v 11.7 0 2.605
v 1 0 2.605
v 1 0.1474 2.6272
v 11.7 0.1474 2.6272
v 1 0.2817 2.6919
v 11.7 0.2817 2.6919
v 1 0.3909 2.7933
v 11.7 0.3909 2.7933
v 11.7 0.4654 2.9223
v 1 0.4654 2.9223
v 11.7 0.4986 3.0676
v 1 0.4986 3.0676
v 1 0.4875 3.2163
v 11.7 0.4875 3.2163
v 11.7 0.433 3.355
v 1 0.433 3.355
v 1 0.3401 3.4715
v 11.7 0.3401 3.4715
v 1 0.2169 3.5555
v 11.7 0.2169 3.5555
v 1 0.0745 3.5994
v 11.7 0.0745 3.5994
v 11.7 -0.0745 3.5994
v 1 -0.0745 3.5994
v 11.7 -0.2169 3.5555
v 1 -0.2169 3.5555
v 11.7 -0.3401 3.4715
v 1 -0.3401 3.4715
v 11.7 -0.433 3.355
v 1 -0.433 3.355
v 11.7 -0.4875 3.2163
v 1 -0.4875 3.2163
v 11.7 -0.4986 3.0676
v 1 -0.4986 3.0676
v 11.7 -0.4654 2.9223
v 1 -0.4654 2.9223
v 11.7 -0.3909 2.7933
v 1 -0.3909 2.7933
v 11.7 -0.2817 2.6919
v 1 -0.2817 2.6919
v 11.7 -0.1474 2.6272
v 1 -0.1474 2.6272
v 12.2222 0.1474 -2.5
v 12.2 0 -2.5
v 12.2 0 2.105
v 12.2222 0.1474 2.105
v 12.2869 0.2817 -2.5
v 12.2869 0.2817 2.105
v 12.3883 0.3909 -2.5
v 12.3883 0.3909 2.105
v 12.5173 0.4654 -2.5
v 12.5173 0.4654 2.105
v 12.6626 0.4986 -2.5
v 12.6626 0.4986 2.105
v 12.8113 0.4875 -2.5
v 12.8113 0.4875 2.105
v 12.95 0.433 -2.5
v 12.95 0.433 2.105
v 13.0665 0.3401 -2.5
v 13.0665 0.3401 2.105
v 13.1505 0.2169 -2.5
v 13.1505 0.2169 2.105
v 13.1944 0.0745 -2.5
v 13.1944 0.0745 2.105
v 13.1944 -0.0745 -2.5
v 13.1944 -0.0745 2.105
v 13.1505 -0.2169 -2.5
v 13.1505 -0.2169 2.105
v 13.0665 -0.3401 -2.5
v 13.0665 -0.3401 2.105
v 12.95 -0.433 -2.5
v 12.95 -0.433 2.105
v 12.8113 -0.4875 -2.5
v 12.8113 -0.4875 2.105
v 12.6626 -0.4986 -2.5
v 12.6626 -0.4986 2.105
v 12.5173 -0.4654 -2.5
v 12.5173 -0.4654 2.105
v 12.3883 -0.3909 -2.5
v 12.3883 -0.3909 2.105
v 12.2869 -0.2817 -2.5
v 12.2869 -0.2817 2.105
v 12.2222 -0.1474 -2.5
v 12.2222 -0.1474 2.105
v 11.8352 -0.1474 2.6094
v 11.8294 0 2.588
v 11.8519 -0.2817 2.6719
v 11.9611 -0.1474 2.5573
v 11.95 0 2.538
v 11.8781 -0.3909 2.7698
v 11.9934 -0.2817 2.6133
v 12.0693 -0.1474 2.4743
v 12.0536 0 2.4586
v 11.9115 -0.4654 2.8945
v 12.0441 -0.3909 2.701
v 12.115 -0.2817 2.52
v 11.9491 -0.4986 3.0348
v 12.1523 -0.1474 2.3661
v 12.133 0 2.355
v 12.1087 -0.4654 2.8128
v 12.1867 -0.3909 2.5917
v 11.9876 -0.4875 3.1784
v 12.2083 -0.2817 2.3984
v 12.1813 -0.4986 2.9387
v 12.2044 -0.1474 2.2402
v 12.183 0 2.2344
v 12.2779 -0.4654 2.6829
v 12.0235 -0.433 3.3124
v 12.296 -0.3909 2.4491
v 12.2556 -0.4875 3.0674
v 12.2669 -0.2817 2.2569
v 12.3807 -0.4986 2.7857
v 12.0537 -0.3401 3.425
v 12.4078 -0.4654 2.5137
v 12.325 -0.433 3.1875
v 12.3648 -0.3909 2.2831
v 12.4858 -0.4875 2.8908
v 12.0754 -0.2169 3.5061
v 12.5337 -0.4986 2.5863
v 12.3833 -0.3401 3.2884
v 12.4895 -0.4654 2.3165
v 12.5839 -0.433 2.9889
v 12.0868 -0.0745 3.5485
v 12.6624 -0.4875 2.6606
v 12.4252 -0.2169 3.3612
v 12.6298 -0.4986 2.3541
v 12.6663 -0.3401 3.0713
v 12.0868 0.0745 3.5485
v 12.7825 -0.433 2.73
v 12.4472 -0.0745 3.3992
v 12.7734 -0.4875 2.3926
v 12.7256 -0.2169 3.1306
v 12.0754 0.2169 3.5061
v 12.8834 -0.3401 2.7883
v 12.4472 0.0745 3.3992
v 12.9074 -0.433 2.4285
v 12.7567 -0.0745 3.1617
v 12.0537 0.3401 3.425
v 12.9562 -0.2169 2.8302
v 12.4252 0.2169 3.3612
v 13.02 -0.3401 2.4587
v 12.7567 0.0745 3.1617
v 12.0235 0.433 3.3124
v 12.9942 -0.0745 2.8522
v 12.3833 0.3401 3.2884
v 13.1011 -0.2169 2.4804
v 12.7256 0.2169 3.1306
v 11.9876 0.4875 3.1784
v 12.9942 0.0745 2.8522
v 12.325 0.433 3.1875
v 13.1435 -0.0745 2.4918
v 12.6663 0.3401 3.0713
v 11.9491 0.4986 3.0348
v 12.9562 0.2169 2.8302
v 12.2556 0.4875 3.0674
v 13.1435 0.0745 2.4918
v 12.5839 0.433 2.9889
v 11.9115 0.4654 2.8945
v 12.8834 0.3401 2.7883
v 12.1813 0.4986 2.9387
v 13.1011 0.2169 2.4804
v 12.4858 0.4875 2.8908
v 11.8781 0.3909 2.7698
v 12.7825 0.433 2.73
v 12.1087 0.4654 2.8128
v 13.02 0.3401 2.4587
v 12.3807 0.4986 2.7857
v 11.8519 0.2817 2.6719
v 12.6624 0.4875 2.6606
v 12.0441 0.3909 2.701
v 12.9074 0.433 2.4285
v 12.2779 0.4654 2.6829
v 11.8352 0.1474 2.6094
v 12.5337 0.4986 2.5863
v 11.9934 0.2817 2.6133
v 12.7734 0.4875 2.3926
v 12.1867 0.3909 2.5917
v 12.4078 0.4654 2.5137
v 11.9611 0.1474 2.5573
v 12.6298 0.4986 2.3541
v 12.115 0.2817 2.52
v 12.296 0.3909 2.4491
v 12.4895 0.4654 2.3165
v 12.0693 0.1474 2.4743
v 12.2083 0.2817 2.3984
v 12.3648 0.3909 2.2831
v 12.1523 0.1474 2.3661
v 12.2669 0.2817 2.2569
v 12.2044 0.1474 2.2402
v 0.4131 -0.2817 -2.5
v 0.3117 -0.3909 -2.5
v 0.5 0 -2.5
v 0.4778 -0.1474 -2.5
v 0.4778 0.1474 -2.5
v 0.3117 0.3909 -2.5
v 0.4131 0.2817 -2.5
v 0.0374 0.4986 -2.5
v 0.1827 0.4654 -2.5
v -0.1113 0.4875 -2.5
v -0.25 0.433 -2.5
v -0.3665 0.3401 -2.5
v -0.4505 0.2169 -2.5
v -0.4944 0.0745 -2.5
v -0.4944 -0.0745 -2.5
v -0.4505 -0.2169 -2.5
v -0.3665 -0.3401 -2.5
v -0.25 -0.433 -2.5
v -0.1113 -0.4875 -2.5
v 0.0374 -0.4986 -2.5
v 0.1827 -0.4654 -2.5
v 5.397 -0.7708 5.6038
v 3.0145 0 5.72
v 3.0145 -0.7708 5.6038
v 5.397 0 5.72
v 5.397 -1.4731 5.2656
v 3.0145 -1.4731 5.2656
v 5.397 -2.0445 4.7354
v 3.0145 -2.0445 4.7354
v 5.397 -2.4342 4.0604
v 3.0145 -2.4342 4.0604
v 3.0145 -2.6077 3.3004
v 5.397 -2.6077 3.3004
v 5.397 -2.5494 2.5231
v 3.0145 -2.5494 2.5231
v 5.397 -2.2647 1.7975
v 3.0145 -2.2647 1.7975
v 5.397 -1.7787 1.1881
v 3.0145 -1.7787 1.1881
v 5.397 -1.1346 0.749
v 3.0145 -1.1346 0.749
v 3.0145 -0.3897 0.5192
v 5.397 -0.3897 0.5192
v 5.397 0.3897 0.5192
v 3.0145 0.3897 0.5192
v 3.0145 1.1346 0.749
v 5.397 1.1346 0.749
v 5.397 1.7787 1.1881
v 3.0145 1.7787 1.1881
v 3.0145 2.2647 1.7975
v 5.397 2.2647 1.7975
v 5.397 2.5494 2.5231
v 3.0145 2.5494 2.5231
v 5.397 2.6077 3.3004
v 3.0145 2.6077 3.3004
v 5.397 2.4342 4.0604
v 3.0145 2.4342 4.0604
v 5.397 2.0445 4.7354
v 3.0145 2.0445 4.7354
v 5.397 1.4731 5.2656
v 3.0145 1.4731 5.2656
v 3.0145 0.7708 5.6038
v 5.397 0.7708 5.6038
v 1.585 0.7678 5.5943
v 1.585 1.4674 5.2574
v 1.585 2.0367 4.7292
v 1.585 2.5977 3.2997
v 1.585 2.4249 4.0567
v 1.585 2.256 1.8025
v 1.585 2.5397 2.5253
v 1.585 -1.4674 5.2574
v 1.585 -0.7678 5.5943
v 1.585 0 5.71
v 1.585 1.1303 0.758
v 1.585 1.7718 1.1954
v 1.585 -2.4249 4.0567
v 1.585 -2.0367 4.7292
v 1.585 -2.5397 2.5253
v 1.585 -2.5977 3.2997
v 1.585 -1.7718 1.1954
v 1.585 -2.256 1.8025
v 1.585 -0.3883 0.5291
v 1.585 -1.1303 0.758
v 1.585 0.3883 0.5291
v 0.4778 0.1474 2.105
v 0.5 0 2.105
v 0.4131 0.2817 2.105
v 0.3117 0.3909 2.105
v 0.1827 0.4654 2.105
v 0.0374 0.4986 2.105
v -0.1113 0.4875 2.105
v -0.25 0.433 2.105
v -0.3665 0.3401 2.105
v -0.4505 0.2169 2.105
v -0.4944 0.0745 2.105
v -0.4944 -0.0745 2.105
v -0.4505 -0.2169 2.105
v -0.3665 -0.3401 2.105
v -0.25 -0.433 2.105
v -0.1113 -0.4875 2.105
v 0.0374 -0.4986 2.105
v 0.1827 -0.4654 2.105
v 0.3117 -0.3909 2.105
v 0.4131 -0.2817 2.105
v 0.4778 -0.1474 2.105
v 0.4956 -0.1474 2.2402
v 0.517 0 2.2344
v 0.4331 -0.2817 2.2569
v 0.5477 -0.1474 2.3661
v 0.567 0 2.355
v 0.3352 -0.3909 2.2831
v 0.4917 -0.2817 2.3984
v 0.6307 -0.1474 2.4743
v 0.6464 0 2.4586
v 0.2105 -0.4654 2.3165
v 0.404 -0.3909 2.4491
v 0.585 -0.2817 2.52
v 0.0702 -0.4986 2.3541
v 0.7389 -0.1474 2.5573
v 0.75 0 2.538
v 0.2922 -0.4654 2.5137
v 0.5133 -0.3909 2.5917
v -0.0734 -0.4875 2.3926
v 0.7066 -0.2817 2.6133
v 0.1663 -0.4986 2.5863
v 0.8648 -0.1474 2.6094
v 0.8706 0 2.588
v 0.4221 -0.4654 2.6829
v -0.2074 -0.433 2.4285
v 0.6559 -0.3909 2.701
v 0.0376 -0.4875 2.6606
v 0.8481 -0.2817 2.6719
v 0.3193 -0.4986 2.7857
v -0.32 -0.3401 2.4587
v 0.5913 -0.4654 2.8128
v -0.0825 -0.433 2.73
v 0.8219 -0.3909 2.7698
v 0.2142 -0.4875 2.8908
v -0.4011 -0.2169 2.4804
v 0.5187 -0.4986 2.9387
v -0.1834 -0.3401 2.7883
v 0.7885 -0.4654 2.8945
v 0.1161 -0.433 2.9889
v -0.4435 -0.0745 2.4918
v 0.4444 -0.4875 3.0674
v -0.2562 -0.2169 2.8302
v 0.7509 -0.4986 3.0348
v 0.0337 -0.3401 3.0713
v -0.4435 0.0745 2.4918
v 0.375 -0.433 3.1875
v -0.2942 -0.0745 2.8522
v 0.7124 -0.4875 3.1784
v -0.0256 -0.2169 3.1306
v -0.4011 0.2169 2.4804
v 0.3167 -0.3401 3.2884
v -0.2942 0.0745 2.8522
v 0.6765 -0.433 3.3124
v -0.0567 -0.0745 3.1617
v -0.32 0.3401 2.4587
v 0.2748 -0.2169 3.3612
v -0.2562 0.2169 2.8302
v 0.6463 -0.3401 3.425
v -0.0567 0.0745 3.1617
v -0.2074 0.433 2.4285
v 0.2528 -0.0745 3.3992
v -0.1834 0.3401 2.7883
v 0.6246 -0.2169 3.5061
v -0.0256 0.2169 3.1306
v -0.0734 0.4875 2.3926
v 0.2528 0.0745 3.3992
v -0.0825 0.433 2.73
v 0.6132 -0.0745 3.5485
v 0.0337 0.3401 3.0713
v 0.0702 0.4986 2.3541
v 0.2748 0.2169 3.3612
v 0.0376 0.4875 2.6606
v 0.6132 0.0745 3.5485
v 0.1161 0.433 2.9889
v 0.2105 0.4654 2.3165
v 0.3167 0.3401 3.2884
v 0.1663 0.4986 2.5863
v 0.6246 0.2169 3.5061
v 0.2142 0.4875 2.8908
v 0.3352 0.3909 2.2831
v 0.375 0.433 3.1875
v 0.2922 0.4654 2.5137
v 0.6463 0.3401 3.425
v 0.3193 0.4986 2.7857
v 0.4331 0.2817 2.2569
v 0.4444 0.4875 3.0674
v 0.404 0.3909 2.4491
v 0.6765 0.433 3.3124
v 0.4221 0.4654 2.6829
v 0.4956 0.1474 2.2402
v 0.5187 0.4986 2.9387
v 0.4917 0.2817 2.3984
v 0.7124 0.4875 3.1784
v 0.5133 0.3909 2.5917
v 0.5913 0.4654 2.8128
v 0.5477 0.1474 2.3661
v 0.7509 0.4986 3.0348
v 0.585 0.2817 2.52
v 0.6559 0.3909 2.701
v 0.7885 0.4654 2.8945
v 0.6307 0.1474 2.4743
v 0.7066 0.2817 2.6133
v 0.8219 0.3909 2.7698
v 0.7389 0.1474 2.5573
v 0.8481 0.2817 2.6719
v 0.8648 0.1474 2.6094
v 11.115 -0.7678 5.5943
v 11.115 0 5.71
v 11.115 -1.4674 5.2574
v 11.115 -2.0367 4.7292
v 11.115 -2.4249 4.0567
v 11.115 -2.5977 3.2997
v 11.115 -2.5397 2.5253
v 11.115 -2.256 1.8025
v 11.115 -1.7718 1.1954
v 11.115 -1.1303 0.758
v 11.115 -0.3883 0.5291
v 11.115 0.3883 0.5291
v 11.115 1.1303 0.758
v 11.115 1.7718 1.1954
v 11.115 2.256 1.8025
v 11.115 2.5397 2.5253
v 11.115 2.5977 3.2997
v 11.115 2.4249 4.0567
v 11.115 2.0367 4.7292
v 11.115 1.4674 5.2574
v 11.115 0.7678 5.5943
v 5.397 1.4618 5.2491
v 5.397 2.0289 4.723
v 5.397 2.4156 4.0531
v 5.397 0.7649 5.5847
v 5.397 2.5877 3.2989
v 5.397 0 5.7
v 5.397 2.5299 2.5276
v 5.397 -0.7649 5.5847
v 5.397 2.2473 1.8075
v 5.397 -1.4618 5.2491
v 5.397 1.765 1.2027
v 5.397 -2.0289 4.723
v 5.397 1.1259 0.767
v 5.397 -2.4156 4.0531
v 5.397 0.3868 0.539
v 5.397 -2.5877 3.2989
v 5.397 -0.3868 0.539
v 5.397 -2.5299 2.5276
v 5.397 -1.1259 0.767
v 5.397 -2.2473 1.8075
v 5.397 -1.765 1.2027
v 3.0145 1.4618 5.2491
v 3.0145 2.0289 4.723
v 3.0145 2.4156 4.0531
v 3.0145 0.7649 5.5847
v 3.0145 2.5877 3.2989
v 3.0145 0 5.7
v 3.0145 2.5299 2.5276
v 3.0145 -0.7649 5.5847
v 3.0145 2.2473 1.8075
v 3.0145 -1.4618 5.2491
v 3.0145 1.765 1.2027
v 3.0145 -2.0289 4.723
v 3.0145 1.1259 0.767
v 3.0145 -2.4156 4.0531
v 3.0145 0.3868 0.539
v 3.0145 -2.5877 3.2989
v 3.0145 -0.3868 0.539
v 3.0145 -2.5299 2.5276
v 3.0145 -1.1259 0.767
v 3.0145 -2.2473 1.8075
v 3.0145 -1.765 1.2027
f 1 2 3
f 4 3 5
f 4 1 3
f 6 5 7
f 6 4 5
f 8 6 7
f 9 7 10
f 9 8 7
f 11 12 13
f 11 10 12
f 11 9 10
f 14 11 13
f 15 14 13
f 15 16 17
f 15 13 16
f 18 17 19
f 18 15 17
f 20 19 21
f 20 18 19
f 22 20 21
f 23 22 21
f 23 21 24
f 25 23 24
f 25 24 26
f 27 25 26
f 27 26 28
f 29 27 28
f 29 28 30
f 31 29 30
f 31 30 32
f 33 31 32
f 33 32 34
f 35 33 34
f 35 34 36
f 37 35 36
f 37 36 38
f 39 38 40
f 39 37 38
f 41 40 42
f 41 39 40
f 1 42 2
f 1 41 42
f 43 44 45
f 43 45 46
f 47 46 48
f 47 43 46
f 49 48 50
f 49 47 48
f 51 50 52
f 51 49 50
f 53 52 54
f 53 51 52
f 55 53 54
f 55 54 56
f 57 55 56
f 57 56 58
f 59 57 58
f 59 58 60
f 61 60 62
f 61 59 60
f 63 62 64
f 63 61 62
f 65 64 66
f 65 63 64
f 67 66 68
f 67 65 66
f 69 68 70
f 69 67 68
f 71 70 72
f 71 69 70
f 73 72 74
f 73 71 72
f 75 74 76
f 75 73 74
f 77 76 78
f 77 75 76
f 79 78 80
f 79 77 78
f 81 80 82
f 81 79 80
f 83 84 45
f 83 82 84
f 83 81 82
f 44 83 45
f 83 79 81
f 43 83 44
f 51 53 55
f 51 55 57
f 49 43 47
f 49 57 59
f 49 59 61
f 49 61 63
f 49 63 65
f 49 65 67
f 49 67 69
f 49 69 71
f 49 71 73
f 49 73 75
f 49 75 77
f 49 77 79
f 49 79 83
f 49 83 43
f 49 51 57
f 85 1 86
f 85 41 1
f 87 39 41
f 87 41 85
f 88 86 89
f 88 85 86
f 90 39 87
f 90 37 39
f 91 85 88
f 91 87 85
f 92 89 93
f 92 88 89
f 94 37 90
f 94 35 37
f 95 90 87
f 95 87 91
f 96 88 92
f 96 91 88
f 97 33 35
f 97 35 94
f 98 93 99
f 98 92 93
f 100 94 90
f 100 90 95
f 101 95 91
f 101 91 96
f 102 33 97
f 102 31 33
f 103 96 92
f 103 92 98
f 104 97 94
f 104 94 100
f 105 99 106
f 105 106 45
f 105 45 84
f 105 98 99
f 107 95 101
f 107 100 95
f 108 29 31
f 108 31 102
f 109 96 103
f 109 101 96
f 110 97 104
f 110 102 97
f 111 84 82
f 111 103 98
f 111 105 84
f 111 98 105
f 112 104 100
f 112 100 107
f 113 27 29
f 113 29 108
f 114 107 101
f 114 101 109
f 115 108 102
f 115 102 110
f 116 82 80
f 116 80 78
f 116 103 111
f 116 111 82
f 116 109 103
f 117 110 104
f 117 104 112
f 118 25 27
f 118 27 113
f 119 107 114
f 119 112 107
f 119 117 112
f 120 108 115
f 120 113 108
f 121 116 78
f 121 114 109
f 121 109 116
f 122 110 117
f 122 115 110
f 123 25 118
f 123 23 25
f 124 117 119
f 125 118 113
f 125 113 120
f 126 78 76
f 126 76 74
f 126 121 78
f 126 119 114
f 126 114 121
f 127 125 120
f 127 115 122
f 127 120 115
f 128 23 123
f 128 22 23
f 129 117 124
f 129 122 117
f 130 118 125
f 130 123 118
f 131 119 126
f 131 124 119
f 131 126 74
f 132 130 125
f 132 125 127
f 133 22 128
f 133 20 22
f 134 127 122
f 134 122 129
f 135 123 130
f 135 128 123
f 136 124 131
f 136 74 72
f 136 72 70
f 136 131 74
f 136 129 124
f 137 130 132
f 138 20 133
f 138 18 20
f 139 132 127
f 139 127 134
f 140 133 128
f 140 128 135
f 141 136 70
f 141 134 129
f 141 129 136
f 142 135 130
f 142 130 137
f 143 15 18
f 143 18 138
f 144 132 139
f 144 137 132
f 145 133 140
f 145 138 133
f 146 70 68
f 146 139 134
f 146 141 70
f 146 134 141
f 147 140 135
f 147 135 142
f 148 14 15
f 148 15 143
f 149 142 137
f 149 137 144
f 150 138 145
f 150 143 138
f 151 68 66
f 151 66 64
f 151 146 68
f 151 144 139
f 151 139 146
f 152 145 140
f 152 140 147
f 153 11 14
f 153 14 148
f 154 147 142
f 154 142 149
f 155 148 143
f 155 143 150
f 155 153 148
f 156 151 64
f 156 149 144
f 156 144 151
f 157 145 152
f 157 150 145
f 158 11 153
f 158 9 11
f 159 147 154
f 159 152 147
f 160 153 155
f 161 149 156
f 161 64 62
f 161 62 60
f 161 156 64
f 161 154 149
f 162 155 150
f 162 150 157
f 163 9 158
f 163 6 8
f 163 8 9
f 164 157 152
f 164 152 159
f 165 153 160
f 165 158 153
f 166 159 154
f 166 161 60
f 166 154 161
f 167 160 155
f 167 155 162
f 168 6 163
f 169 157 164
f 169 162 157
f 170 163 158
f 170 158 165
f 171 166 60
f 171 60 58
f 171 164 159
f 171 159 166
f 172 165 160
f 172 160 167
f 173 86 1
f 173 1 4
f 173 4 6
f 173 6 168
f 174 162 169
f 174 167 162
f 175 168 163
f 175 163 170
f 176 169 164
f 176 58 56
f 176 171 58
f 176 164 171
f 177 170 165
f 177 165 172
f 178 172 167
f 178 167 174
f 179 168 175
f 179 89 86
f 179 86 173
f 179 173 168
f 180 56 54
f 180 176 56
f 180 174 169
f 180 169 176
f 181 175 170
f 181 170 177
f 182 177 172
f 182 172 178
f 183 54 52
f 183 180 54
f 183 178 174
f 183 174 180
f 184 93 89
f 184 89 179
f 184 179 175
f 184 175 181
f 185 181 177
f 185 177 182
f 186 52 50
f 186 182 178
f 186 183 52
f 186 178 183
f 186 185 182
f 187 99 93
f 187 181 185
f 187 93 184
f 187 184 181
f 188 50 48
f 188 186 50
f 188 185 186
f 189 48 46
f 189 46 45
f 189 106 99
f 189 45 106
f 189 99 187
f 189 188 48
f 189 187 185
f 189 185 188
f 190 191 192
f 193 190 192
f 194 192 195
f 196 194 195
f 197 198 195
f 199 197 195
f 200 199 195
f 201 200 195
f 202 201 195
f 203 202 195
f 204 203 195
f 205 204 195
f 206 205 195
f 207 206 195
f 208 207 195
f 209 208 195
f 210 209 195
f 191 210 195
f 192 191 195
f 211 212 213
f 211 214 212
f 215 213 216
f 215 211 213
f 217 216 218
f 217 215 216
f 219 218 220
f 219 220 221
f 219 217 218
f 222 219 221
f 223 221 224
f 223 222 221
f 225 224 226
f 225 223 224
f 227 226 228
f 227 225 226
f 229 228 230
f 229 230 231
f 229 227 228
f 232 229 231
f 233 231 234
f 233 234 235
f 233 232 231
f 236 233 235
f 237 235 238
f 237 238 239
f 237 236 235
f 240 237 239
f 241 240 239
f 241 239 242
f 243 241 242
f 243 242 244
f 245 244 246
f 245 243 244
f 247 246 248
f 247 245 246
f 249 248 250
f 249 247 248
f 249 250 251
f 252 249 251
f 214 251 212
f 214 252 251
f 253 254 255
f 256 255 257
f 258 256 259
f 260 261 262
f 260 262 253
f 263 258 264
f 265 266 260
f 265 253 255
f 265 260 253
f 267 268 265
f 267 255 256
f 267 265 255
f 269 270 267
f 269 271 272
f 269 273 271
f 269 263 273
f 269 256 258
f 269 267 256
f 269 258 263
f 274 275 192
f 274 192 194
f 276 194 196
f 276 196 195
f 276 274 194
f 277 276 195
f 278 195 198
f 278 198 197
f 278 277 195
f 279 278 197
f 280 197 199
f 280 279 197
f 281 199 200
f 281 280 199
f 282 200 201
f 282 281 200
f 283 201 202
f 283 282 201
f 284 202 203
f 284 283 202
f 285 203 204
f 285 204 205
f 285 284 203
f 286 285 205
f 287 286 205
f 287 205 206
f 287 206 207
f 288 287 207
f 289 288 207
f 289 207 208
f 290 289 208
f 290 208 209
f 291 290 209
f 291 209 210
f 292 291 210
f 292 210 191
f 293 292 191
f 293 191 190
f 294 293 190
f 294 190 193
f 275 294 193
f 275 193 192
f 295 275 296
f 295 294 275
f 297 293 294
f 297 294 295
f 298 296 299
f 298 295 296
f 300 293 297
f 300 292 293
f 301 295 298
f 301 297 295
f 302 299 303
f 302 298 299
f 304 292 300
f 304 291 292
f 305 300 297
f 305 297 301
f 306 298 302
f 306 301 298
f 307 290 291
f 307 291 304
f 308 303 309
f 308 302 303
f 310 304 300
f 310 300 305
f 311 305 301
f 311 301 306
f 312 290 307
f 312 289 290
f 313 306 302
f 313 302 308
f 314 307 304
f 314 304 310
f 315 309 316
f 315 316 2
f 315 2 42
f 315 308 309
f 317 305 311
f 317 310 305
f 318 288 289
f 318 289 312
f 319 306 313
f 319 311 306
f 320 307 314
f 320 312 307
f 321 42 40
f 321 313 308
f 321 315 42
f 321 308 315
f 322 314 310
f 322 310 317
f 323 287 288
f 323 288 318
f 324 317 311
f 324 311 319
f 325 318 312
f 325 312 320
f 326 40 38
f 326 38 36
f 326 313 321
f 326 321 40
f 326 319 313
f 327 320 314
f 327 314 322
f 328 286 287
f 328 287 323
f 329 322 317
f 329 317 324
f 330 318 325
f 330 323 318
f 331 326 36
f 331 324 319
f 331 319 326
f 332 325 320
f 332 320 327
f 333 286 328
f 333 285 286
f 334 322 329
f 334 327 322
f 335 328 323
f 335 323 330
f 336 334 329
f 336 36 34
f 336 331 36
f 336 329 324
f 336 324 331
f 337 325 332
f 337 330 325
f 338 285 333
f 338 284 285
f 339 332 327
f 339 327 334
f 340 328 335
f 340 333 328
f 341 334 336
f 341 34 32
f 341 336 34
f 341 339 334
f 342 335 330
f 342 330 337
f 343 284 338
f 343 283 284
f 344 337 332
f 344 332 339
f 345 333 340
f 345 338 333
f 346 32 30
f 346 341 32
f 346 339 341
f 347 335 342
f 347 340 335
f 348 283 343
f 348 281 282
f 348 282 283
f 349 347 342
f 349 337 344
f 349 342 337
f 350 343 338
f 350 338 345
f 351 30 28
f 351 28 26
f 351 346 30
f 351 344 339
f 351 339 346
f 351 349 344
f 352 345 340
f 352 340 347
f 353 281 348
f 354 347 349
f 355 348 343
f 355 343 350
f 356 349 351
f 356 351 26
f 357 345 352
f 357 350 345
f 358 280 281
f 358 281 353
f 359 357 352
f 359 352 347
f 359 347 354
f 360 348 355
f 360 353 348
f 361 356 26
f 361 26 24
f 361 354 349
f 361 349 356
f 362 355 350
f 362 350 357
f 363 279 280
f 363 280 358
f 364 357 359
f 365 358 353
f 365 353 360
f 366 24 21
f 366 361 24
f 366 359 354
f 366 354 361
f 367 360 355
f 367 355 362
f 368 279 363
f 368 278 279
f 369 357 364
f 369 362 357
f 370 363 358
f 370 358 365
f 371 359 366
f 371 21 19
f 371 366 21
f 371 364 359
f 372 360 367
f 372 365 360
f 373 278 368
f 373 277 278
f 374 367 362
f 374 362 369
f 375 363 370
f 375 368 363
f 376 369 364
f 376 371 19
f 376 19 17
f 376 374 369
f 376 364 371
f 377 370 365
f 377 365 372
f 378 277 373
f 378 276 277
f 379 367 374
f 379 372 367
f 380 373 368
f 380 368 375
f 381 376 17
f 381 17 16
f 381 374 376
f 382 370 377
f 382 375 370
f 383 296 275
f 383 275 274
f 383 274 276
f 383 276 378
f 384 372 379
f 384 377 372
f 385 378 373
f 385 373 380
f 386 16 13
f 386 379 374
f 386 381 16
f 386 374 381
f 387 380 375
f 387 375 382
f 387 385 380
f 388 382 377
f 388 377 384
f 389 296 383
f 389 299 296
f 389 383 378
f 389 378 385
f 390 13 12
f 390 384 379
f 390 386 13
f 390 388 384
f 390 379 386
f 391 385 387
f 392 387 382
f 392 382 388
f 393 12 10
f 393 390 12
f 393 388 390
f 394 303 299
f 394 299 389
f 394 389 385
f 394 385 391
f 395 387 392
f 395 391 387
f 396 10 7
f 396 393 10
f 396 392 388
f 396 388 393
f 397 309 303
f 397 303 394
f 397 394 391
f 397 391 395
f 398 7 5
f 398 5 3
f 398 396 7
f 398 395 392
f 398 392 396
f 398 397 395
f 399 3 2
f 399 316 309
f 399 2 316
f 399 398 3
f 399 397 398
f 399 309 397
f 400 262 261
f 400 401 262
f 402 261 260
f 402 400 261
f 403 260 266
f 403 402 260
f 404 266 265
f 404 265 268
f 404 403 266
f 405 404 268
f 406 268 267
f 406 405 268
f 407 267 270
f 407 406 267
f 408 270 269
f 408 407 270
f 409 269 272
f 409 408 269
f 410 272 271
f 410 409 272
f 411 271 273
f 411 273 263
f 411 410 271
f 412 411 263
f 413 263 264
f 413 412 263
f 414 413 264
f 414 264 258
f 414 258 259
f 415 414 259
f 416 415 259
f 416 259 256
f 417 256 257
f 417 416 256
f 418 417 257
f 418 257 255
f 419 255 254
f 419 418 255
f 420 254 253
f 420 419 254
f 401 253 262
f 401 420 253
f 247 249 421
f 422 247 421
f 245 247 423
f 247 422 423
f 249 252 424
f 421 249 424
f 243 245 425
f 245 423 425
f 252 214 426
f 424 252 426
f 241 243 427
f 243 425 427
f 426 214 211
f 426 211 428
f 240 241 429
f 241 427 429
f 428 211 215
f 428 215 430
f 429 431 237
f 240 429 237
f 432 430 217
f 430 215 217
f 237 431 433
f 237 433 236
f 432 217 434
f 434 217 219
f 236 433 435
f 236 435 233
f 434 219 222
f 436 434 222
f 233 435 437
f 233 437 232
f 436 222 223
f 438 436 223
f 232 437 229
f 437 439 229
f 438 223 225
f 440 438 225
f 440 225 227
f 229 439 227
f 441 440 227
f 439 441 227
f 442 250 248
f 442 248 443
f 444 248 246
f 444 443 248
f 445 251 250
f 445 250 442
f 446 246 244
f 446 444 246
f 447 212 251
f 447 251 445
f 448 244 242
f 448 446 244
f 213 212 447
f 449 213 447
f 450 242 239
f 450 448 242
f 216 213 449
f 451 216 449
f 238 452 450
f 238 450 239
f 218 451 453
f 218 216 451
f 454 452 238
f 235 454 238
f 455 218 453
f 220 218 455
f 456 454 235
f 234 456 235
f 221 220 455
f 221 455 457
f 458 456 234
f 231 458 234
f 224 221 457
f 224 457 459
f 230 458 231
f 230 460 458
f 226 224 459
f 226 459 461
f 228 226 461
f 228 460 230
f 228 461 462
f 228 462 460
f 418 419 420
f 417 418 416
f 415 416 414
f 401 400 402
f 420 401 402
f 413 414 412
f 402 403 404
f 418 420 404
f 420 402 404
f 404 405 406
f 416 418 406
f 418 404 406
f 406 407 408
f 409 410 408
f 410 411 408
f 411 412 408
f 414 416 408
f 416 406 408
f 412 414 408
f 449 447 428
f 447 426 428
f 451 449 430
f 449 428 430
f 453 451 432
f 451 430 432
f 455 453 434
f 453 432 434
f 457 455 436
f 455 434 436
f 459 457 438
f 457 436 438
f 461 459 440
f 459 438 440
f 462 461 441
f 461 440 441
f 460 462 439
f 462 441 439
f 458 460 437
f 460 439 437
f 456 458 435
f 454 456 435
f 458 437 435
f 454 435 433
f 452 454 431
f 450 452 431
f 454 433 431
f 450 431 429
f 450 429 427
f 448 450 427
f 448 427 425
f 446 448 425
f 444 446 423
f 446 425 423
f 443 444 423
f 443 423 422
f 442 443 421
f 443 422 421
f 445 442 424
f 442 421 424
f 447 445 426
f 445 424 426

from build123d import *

# Parameters (mm, degrees)
SKETCH002_W = 9.53
SKETCH002_H = 2.605
SKETCH003_W = 2.3825
SKETCH003_H = 0.02
SKETCH_R    = 0.5


with BuildPart() as revolution:
    # Sketch002 → Revolution (revolve)
    with BuildSketch(Plane.XZ):
        with Locations((6.35, 4.4075)):
            Rectangle(SKETCH002_W, SKETCH002_H)
    revolve(axis=Axis((1.585, 0, 3.105), (1, 0, 0)))


with BuildPart() as revolution001:
    # Sketch003 → Revolution001 (revolve)
    with BuildSketch(Plane.XZ):
        with Locations((4.20575, 5.71)):
            Rectangle(SKETCH003_W, SKETCH003_H)
    revolve(axis=Axis((0, 0, 3.105), (1, 0, 0)))


with BuildPart() as sweep_body:
    # Sweep: sweep along a path in Sketch001
    with BuildLine(Plane.XZ) as sweep_path:
        Line((0, -2.5), (0, 2.105))
        ThreePointArc((0, 2.105), (0.292893, 2.812107), (1, 3.105))
        Line((1, 3.105), (11.7, 3.105))
        ThreePointArc((11.7, 3.105), (12.407107, 2.812107), (12.7, 2.105))
        Line((12.7, 2.105), (12.7, -2.5))
    # Sketch → Sweep (sweep)
    with BuildSketch(Plane.XY.offset(-2)):
        Circle(SKETCH_R)
    sweep(path=sweep_path.line)


solid = Compound([revolution.part, revolution001.part, sweep_body.part])
